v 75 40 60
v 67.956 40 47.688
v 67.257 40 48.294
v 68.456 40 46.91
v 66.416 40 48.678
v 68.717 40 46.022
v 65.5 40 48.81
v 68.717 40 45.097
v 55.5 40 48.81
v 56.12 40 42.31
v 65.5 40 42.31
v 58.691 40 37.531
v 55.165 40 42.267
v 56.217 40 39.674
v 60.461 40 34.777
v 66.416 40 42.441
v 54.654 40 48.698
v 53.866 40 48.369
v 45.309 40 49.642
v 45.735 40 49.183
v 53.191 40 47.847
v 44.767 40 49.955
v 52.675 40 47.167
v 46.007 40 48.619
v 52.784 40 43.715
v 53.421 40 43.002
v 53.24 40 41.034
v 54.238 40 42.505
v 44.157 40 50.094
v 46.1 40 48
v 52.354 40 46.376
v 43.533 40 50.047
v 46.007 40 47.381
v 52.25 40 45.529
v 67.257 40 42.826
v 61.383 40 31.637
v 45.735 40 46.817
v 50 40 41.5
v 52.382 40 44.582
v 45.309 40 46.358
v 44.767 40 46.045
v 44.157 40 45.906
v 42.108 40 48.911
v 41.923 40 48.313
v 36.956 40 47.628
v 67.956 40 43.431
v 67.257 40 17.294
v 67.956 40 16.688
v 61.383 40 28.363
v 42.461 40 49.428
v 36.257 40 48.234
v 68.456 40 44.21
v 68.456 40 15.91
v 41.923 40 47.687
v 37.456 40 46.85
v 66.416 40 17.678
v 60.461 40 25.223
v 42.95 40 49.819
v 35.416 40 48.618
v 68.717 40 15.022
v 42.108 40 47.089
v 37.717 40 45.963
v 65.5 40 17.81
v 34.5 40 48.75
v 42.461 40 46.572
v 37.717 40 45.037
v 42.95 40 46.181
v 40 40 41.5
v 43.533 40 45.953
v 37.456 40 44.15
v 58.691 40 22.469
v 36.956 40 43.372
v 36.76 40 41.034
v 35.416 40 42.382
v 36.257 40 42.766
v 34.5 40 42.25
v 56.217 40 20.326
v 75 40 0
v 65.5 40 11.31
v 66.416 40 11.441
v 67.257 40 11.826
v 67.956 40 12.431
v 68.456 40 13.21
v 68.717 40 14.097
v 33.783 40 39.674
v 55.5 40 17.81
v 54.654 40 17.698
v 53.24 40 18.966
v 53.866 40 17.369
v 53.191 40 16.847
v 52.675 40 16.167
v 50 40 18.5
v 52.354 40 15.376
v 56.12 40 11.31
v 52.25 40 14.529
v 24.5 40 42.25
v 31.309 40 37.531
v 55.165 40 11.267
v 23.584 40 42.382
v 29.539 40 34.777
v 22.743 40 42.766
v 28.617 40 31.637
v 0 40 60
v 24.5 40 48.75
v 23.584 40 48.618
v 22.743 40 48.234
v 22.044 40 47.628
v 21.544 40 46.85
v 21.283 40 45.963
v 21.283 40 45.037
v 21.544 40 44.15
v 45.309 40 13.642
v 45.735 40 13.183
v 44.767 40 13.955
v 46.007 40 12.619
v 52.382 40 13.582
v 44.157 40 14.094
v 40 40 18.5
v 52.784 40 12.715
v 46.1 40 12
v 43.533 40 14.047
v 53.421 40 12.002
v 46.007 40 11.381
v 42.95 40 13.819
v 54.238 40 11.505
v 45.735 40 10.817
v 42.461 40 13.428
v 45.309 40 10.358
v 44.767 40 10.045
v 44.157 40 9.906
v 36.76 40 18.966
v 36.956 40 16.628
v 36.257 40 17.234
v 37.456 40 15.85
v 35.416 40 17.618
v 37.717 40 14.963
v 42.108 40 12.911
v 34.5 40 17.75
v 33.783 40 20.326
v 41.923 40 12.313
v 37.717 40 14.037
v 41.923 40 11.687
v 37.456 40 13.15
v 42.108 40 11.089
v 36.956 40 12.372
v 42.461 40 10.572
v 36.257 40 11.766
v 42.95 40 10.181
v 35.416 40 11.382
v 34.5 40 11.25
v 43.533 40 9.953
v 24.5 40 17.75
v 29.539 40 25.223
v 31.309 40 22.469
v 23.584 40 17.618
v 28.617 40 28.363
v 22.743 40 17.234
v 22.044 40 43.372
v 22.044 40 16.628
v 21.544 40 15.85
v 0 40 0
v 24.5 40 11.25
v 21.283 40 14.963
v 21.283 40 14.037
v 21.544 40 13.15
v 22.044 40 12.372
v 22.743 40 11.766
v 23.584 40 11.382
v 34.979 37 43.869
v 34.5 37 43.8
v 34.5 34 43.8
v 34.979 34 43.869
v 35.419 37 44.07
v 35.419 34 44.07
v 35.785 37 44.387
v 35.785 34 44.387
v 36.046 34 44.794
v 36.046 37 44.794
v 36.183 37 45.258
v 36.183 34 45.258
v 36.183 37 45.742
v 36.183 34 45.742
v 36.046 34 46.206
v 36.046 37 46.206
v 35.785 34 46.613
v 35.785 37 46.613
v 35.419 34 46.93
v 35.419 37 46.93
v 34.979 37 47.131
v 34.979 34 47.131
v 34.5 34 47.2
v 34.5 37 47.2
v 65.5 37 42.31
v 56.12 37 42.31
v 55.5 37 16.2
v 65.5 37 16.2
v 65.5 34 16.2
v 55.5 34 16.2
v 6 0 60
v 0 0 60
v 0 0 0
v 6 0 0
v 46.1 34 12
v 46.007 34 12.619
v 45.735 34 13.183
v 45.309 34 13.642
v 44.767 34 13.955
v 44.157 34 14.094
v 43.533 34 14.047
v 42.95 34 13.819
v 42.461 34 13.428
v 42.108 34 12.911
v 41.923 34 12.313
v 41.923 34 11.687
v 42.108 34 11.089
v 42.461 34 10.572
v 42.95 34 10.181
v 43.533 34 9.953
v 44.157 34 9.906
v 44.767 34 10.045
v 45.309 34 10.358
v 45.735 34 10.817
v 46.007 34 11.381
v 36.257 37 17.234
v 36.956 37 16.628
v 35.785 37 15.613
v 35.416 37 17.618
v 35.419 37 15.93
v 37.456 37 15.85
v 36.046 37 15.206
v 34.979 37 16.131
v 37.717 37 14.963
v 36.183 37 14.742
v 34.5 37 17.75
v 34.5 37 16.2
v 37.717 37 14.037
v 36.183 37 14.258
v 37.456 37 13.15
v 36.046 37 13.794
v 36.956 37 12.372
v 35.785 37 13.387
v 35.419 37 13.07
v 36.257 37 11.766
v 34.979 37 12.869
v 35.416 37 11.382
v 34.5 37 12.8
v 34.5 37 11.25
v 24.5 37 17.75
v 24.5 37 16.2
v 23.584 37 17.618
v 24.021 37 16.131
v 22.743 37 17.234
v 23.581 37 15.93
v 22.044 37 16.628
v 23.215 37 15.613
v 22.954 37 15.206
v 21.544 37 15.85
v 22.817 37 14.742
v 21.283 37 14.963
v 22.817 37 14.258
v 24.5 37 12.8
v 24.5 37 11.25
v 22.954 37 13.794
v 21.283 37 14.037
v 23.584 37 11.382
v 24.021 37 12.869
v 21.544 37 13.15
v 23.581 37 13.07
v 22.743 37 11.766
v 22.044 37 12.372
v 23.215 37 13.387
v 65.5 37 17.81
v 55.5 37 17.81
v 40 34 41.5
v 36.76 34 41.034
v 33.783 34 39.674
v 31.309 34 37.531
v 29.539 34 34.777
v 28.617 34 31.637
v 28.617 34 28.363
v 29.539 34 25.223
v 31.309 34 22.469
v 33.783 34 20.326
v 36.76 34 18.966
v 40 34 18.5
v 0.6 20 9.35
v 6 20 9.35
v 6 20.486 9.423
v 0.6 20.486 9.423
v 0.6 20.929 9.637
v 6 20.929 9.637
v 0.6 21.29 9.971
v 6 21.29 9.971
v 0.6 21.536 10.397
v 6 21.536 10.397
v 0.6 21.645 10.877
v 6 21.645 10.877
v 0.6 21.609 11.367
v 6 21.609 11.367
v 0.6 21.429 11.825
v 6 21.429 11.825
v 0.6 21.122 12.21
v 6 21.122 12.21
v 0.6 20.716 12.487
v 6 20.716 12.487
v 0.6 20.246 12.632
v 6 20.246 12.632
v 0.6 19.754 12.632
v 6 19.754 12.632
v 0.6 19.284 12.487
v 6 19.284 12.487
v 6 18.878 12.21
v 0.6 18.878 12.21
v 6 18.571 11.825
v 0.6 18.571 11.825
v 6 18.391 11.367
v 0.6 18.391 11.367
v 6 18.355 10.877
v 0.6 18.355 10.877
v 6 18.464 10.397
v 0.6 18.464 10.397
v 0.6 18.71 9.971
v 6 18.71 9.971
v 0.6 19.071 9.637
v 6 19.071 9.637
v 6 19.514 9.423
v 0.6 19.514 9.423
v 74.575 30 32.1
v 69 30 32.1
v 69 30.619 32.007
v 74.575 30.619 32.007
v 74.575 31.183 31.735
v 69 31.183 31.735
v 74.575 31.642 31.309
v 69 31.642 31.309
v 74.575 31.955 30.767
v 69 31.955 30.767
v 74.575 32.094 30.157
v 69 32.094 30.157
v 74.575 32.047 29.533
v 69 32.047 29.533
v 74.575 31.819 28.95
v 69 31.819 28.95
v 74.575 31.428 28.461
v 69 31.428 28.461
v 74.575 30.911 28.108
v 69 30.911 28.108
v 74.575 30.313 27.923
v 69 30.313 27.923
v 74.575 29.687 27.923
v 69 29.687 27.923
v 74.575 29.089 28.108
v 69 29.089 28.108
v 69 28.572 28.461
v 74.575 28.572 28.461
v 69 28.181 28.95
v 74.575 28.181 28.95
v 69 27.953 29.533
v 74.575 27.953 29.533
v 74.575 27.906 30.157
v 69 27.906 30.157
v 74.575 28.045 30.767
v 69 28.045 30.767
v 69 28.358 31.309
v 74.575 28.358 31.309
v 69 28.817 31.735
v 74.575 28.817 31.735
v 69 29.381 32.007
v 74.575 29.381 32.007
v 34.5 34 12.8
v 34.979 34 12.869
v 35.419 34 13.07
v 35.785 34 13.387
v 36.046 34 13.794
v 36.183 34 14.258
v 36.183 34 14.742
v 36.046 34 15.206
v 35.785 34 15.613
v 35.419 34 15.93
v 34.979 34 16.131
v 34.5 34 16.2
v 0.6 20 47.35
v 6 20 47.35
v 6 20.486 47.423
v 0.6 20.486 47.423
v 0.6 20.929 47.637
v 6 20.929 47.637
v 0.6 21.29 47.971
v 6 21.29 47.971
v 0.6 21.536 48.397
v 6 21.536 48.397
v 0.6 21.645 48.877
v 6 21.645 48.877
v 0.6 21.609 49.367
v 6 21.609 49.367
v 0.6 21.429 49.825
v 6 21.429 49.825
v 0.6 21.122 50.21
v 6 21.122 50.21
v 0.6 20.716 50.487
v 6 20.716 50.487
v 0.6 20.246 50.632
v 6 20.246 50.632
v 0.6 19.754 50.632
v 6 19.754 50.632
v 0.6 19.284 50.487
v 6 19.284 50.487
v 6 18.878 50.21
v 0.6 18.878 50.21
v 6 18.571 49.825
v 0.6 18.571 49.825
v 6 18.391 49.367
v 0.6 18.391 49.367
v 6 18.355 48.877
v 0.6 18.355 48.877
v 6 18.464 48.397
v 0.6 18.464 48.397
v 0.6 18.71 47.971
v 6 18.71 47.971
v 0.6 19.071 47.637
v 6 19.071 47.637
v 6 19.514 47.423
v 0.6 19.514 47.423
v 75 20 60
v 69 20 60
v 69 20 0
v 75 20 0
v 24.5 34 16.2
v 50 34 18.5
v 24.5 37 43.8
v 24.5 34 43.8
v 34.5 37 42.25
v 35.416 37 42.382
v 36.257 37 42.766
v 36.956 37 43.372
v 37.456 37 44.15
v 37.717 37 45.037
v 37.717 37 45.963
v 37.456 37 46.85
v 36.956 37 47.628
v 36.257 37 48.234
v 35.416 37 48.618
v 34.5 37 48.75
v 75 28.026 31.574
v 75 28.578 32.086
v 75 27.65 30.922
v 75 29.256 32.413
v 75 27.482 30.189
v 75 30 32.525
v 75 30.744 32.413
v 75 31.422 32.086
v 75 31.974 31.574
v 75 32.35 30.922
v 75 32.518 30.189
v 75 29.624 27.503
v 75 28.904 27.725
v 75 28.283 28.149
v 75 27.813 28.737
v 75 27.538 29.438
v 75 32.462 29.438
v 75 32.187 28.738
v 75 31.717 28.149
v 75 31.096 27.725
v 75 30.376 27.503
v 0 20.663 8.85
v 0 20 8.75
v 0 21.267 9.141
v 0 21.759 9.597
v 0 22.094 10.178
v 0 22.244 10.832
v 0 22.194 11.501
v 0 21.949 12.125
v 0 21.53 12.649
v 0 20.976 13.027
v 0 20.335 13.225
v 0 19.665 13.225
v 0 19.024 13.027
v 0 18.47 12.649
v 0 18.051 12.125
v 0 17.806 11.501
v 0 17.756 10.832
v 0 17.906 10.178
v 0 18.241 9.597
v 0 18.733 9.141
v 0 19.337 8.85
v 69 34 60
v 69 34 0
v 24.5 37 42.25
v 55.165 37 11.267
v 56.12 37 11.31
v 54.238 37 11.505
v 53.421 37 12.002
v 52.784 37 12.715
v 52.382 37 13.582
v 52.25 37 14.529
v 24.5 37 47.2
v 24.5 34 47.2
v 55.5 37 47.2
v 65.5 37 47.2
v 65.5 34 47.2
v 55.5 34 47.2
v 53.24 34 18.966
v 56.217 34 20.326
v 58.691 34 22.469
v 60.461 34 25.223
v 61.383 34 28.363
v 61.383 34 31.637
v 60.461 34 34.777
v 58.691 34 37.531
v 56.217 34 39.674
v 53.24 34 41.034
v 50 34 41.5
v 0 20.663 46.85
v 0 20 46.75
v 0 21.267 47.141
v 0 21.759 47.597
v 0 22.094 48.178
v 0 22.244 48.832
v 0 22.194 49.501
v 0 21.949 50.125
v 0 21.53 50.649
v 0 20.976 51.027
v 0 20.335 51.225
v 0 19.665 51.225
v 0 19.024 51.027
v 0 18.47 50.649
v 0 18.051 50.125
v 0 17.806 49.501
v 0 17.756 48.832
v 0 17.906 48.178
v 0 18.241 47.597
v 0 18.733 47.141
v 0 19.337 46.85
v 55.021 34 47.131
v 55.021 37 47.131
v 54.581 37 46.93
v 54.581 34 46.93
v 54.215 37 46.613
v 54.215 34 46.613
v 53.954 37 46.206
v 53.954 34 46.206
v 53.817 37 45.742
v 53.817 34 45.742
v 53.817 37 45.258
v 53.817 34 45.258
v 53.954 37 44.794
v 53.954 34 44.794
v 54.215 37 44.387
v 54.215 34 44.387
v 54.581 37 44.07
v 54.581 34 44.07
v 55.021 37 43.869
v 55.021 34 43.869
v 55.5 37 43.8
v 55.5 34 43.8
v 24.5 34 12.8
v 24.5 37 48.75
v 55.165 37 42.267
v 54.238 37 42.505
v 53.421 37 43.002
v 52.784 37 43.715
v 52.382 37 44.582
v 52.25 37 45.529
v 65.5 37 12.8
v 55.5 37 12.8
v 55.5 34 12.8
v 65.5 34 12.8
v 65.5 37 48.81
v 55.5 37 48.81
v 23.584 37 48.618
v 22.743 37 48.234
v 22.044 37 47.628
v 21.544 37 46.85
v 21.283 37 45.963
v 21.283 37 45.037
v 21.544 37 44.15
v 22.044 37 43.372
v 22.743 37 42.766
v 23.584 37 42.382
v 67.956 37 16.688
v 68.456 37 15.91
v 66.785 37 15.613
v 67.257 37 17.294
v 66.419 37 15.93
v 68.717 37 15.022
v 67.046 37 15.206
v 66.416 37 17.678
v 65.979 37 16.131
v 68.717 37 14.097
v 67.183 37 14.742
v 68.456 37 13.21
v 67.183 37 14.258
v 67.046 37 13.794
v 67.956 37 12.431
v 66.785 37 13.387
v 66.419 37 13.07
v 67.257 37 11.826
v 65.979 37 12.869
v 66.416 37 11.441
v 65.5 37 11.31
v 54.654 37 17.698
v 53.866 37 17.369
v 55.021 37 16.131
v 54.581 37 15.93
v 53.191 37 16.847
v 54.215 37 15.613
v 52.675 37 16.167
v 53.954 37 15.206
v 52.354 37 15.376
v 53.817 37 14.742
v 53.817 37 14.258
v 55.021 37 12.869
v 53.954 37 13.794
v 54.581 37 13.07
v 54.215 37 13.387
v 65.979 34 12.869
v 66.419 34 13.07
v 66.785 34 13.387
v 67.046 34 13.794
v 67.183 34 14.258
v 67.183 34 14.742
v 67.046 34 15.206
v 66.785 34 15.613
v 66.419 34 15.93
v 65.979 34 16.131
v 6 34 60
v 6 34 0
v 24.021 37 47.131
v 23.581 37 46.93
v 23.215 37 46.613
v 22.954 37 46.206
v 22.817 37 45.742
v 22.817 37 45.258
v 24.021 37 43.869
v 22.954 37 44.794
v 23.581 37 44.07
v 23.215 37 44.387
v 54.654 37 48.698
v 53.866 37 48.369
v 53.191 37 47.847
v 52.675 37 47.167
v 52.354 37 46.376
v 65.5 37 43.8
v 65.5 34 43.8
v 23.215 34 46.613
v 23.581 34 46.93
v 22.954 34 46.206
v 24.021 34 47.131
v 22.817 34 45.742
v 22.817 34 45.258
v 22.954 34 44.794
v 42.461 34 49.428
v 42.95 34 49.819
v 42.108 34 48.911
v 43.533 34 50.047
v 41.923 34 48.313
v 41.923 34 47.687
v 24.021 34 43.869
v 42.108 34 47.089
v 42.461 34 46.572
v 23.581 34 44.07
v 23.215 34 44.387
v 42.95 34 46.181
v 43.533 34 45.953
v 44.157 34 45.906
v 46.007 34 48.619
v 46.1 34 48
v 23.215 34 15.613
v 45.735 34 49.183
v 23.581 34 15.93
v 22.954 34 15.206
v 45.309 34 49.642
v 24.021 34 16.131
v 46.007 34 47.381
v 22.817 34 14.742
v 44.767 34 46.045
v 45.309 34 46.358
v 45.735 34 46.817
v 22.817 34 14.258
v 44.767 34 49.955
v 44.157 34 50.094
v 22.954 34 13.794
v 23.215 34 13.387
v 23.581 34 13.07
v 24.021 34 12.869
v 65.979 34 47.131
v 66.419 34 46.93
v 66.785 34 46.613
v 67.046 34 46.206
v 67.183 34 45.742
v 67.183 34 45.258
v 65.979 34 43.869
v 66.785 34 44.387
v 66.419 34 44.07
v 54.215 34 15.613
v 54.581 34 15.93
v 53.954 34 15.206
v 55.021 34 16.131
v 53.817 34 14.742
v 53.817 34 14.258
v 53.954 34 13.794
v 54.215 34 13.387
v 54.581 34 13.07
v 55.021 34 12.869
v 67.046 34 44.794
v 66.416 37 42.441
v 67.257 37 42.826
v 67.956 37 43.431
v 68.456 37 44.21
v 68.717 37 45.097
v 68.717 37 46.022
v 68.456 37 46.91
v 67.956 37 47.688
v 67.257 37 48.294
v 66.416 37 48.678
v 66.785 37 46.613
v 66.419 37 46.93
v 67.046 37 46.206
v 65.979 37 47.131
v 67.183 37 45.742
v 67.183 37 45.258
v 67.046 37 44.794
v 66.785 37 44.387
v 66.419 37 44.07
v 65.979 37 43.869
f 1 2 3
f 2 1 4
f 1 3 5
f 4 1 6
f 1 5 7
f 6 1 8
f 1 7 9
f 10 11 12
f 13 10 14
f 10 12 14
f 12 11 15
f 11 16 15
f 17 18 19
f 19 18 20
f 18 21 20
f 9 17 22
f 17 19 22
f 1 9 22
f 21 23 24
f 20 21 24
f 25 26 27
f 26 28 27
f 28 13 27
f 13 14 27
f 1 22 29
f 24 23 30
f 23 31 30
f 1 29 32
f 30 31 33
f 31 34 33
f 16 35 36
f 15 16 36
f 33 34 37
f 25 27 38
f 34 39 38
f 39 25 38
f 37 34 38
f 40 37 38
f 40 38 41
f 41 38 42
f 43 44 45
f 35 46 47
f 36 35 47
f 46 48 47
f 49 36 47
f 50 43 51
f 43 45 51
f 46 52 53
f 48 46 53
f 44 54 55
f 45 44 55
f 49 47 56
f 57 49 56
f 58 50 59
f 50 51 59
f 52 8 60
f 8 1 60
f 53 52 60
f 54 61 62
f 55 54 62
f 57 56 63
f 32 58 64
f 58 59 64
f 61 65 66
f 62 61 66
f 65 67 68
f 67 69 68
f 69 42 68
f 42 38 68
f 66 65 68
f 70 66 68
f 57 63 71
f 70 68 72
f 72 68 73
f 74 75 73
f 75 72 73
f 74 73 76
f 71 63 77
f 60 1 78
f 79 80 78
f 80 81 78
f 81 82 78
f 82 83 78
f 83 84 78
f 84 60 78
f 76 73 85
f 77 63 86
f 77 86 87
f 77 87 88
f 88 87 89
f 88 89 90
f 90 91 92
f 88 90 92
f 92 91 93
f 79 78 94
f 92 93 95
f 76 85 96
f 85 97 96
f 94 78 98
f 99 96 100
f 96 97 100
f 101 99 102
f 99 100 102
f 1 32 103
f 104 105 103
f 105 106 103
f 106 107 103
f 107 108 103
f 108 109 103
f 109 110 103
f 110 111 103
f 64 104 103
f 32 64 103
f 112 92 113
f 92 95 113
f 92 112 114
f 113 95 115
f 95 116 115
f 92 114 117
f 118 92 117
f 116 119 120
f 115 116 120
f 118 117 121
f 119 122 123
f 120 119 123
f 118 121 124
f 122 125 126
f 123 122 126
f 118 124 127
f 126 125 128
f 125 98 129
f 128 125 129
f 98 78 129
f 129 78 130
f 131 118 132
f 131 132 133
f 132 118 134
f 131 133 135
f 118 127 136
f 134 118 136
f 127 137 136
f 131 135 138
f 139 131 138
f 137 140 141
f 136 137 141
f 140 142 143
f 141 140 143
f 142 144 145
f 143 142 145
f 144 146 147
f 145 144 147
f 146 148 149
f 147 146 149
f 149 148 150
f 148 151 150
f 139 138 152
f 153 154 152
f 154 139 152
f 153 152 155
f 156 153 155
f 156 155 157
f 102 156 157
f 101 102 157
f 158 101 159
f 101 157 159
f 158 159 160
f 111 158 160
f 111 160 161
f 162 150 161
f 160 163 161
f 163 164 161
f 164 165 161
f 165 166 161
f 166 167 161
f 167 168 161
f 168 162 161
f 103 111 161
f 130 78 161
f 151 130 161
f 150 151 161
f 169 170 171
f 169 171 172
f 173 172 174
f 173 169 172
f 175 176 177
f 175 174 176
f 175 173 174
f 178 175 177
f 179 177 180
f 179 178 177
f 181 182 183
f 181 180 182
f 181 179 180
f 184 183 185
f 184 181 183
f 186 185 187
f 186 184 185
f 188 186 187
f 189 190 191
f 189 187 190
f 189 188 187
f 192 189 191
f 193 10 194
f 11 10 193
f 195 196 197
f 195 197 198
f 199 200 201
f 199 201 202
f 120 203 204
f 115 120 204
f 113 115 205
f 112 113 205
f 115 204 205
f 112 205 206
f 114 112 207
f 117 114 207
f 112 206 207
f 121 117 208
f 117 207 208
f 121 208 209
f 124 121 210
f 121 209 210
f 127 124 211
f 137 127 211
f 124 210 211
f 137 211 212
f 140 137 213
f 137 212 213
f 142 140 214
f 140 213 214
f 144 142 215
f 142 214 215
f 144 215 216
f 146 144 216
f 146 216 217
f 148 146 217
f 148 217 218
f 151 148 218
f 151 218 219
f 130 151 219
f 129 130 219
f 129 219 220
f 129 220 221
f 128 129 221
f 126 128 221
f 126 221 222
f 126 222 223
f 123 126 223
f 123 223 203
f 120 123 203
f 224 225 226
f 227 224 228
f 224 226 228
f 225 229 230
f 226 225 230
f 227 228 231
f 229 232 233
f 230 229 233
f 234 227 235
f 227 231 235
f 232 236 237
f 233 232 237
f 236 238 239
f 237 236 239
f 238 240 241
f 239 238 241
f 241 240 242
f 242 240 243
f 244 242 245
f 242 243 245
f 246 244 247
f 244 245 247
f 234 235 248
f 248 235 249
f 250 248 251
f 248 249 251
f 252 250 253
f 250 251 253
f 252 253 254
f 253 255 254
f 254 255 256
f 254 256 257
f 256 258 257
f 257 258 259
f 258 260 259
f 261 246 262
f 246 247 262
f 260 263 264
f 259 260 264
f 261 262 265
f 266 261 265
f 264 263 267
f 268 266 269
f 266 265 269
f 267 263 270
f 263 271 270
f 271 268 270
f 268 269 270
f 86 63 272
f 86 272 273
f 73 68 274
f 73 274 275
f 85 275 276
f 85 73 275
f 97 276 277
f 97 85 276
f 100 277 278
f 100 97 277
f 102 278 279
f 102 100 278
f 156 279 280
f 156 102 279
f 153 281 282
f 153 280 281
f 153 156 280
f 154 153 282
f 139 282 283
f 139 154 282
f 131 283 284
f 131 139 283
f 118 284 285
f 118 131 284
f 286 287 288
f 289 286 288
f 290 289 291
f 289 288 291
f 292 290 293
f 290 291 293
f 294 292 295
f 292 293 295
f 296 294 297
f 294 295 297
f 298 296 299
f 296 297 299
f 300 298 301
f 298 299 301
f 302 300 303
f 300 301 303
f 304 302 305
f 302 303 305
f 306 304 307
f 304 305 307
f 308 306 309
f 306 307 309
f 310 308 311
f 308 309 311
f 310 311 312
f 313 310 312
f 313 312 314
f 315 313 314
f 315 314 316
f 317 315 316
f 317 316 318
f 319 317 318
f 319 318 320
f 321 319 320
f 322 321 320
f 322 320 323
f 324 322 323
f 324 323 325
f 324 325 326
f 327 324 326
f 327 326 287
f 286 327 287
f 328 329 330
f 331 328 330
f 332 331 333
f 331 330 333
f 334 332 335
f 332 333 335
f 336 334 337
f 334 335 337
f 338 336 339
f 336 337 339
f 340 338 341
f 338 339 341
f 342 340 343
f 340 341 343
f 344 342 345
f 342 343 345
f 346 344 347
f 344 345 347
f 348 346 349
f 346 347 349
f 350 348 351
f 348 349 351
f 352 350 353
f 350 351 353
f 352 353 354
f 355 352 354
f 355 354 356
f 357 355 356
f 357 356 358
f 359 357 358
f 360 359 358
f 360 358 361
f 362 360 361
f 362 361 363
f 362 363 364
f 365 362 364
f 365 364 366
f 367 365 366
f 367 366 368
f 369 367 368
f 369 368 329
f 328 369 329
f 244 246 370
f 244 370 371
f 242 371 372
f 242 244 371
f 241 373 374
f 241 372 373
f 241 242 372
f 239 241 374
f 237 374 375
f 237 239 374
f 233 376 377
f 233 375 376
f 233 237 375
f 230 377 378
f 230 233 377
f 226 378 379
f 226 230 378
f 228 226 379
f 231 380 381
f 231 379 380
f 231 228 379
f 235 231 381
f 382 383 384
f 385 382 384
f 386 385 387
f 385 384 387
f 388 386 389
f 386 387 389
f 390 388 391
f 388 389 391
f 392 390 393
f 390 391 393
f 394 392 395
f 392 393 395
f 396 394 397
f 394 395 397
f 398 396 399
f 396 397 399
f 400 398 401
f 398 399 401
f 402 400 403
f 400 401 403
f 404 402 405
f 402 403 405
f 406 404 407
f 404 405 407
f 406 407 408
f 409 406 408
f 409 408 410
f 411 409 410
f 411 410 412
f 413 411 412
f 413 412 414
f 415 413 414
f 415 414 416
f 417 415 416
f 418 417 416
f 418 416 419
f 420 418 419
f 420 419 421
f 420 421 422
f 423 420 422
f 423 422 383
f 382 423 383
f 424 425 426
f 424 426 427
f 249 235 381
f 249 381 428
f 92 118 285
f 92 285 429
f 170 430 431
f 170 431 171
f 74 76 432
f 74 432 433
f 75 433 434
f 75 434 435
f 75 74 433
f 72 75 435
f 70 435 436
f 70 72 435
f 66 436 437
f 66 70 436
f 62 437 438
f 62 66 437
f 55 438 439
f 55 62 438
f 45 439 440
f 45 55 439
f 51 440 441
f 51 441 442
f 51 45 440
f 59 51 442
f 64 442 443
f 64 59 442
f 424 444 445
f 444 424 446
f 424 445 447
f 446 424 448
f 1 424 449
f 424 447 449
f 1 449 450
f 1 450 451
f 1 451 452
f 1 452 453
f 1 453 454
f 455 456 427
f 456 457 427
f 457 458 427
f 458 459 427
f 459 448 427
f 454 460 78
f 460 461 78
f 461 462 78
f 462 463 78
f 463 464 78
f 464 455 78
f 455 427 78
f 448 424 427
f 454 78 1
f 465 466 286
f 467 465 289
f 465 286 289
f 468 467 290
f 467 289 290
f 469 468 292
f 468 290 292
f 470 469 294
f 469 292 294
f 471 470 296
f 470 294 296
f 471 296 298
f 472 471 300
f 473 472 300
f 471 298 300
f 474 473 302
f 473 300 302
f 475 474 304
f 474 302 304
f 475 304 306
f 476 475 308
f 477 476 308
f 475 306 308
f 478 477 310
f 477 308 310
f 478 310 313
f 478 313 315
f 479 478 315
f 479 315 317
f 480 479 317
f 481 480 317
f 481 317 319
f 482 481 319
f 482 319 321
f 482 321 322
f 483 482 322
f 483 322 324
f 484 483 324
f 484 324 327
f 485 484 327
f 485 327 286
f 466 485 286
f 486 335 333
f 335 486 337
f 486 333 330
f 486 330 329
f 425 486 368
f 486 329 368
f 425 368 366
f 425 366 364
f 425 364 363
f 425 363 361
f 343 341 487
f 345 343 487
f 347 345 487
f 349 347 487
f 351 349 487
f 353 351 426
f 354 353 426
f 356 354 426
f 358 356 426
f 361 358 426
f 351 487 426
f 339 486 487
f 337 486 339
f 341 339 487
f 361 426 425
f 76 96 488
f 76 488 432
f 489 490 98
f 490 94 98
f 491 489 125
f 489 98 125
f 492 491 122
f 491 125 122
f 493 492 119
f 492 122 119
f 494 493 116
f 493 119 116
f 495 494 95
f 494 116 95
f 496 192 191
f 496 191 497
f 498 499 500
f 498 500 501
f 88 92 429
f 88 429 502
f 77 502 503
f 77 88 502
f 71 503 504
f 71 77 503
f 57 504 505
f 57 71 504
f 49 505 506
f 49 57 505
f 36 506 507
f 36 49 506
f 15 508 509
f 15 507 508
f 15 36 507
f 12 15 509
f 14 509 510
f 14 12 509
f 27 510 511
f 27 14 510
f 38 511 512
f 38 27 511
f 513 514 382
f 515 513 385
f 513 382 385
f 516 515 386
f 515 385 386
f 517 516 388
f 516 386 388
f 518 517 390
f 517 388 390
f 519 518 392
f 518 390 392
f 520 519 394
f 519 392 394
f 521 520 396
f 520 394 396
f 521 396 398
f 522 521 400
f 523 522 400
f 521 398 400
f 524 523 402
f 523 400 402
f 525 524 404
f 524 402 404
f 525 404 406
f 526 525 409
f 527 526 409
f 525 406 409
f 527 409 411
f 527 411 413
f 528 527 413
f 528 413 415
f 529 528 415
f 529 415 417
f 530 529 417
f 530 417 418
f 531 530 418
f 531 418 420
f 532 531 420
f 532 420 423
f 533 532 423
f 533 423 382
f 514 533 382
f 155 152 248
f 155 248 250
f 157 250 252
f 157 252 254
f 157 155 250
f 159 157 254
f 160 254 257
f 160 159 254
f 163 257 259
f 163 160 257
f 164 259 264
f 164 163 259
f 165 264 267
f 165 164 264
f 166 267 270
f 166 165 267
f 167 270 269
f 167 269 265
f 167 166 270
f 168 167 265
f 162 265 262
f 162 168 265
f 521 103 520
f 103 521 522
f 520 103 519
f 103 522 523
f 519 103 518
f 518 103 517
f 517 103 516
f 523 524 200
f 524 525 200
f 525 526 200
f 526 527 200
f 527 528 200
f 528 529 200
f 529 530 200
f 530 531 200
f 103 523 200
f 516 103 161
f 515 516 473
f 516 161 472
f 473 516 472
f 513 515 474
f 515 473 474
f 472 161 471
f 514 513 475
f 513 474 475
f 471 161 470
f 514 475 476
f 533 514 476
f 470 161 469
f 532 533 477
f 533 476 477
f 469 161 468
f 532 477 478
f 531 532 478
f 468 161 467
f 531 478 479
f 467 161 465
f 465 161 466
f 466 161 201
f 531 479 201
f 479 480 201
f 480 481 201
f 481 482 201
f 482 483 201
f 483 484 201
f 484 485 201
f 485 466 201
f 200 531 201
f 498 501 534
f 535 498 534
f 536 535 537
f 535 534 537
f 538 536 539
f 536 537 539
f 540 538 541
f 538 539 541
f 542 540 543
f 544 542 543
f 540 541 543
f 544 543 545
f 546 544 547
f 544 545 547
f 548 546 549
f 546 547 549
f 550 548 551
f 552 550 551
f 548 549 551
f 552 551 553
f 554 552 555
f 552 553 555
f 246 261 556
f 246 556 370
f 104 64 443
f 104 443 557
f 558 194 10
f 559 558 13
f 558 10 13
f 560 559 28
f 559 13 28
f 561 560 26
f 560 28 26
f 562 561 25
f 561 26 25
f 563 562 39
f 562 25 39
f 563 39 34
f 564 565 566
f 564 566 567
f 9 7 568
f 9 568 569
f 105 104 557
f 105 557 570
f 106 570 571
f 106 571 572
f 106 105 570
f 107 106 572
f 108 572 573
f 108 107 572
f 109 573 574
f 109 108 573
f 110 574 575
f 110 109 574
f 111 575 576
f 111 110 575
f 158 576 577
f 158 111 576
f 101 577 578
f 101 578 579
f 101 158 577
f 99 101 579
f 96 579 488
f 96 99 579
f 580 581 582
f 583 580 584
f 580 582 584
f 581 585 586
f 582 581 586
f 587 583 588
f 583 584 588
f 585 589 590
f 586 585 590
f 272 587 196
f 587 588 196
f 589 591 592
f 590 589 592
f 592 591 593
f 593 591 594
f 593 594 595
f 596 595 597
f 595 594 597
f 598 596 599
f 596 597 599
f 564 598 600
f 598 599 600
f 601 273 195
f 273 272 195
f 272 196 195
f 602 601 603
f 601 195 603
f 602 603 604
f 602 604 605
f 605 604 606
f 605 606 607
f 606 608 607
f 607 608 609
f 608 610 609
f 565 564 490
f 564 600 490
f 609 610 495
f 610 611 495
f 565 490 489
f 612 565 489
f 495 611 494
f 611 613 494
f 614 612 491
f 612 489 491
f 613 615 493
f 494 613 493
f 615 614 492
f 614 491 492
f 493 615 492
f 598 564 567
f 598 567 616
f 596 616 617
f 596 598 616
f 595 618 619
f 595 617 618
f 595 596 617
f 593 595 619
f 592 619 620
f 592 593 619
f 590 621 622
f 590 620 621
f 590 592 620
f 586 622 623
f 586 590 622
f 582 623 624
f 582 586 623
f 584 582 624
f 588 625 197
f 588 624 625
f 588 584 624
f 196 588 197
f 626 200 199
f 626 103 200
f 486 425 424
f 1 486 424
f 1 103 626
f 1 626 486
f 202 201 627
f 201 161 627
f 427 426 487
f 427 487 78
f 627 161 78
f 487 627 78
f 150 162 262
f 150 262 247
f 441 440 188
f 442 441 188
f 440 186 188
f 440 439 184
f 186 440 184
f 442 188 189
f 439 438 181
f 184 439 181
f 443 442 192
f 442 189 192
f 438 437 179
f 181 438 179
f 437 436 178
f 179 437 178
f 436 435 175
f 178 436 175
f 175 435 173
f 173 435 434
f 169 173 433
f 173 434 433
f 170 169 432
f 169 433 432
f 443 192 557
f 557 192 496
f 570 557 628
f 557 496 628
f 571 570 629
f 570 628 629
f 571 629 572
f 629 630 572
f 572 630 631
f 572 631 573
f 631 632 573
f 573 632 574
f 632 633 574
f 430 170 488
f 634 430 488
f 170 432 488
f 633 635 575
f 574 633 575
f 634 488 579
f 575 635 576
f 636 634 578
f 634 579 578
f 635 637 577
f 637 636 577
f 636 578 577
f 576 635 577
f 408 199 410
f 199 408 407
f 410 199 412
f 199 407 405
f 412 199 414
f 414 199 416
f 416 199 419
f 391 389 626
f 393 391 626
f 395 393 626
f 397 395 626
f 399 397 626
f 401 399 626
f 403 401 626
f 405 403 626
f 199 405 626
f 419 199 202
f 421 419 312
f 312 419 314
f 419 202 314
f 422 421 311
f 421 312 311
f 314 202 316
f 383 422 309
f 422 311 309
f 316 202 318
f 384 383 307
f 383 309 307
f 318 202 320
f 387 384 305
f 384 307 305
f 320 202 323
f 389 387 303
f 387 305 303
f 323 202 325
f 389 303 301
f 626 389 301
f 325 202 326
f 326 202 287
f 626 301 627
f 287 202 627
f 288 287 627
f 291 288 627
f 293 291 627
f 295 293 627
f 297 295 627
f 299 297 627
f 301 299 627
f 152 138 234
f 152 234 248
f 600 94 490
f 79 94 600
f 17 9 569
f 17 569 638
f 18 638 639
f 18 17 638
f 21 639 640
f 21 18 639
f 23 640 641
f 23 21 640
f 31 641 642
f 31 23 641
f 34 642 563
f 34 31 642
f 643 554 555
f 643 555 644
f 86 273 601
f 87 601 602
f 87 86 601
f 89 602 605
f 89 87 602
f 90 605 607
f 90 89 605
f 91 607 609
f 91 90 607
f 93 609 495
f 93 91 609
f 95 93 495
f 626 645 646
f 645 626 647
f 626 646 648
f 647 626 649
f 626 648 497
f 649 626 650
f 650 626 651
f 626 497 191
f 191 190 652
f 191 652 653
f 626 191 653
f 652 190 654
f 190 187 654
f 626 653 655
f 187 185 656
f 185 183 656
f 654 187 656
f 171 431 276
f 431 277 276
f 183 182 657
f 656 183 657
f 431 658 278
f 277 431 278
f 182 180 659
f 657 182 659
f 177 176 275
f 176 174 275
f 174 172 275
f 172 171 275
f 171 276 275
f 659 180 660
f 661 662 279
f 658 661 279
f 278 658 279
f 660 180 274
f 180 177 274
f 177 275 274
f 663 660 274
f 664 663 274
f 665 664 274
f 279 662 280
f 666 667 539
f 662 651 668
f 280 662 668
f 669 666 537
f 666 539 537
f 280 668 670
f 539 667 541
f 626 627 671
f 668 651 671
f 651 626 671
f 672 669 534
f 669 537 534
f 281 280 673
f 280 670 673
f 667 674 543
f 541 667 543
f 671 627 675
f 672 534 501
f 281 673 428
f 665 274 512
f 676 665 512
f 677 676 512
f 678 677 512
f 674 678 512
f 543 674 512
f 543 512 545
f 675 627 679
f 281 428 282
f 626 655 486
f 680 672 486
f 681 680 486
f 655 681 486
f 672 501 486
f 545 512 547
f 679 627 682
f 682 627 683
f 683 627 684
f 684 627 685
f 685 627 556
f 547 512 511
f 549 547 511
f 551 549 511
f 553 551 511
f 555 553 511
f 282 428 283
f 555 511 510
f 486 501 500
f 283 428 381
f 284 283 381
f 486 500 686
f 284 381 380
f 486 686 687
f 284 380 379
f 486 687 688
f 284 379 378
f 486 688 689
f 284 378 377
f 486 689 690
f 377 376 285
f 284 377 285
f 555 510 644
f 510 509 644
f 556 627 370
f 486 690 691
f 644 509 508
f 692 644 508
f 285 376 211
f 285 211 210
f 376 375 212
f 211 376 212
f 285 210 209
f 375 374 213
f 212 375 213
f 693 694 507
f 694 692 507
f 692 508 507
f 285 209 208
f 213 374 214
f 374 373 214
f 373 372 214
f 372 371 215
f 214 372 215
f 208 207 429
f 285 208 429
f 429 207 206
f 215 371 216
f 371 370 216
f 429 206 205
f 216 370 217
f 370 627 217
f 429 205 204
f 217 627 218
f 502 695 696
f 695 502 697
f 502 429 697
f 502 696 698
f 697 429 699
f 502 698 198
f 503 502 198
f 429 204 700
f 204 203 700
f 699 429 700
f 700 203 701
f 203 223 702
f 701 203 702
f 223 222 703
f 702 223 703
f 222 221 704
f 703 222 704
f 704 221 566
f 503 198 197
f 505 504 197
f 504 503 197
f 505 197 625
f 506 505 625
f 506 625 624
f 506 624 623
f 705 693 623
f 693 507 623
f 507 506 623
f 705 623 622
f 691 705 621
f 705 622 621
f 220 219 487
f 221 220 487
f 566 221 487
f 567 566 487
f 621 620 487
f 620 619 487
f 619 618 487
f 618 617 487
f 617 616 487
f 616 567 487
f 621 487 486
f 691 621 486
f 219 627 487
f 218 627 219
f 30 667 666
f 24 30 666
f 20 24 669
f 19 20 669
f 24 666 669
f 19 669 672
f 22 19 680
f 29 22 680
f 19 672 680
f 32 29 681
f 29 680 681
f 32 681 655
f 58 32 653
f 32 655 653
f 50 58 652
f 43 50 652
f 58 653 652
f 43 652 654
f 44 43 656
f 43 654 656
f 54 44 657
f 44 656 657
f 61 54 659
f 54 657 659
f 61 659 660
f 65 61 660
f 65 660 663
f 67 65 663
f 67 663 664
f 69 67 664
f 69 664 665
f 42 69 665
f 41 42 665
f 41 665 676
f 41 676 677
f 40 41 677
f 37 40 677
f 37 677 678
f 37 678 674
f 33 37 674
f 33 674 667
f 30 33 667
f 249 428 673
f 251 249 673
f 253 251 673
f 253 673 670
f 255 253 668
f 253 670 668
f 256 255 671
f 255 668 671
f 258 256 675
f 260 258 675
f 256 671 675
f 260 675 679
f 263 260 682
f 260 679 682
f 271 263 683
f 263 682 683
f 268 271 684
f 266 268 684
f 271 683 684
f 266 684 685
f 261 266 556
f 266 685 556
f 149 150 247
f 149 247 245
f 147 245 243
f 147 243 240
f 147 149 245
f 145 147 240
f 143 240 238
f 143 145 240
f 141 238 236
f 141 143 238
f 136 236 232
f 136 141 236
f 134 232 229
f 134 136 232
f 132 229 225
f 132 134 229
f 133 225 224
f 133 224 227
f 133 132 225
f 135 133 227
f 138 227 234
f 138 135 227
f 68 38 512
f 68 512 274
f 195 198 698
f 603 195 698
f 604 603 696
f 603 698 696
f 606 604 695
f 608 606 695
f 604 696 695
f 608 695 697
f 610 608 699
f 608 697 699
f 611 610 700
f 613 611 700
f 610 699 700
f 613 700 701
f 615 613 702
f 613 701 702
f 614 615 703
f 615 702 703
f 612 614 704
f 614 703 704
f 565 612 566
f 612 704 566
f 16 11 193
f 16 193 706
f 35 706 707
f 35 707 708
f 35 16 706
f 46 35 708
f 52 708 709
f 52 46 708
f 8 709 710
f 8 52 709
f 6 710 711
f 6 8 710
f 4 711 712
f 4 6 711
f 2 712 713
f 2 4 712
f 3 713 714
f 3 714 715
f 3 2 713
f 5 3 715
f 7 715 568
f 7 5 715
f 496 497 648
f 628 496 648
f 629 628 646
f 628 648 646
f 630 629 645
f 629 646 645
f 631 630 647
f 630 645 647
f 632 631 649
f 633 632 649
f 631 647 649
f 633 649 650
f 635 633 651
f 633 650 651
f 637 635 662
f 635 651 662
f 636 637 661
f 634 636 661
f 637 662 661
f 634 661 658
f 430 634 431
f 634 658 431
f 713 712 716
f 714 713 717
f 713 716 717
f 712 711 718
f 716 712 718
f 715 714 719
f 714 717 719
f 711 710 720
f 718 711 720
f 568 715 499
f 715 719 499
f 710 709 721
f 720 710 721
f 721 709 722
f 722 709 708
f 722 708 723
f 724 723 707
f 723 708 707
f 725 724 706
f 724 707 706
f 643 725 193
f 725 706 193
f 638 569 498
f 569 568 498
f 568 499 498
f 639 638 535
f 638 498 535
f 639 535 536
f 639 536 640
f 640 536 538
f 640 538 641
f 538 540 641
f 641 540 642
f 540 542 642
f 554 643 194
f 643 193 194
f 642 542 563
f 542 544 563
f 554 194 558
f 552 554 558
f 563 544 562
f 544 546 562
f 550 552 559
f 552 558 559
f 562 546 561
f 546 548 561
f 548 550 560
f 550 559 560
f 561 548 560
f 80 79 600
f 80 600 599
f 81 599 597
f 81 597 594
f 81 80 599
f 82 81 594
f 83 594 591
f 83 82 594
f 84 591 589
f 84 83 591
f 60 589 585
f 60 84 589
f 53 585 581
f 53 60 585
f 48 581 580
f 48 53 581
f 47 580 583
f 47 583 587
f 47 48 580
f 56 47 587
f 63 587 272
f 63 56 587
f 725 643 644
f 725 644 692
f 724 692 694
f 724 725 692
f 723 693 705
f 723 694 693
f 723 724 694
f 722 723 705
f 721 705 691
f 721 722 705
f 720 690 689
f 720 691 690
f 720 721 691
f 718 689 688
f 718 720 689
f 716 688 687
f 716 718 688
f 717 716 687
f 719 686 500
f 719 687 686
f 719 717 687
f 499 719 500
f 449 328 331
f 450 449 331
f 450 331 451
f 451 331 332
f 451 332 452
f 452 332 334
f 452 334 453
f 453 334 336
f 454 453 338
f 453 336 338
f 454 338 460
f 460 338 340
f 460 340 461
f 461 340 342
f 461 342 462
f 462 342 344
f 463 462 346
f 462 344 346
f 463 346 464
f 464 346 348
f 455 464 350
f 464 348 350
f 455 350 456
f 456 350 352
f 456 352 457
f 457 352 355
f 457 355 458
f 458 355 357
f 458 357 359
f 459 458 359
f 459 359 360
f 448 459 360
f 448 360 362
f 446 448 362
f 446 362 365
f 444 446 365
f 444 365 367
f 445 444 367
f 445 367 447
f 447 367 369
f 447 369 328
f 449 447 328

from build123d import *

# Parameters (mm, degrees)
BOSS_EXTRUDE1_DEPTH                                 = 60
CUT_EXTRUDE1_DEPTH                                  = 105.043260233
CBORE_FOR_M3_HEX_SOCKET_HEAD_CAP_SCREW1_D           = 3.4
CBORE_FOR_M3_HEX_SOCKET_HEAD_CAP_SCREW1_CBORE_D     = 6.5
CBORE_FOR_M3_HEX_SOCKET_HEAD_CAP_SCREW1_CBORE_DEPTH = 3
CUT_EXTRUDE5_REACH                                  = 106.043
CUT_EXTRUDE6_DEPTH                                  = 3
M5_TAPPED_HOLE1_D                                   = 4.2
M4_TAPPED_HOLE1_D                                   = 3.3
M4_TAPPED_HOLE1_DEPTH                               = 6
M4_TAPPED_HOLE1_CSINK_D                             = 4.5
M4_TAPPED_HOLE1_CSINK_ANGLE                         = 90
M5_TAPPED_HOLE2_D                                   = 4.2
M5_TAPPED_HOLE2_DEPTH                               = 6
M5_TAPPED_HOLE2_CSINK_D                             = 5.05
M5_TAPPED_HOLE2_CSINK_ANGLE                         = 90


with BuildPart() as part:
    # Sketch1 → Boss-Extrude1 (new body)
    with BuildSketch(Plane.XY):
        Polygon((0, 0), (6, 0), (6, 34), (69, 34), (69, 20), (75, 20), (75, 40), (0, 40), align=None)
    extrude(amount=BOSS_EXTRUDE1_DEPTH)

    # Sketch2 → Cut-Extrude1 (cut, through all)
    with BuildSketch(Plane(origin=(0, 40, 0), x_dir=(1, 0, 0), z_dir=(0, 1, 0))):
        with BuildLine():
            Line((40, -18.5), (50, -18.5))
            ThreePointArc((50, -18.5), (61.5, -30), (50, -41.5))
            Line((50, -41.5), (40, -41.5))
            ThreePointArc((40, -41.5), (28.5, -30), (40, -18.5))
        make_face()
    extrude(amount=-CUT_EXTRUDE1_DEPTH, mode=Mode.SUBTRACT)

    # CBORE for M3 Hex Socket Head Cap Screw1 (through all)
    with Locations(Plane(origin=(0, 40, 0), x_dir=(-1, 0, 0), z_dir=(0, 1, 0))):
        with Locations((-24.5, 45.5), (-55.5, 45.5), (-24.5, 14.5), (-55.5, 14.5)):
            CounterBoreHole(CBORE_FOR_M3_HEX_SOCKET_HEAD_CAP_SCREW1_D / 2, CBORE_FOR_M3_HEX_SOCKET_HEAD_CAP_SCREW1_CBORE_D / 2, CBORE_FOR_M3_HEX_SOCKET_HEAD_CAP_SCREW1_CBORE_DEPTH)

    # Sketch24 → Cut-Extrude5 (cut, up to next)
    with BuildSketch(Plane(origin=(0, 40, 0), x_dir=(1, 0, 0), z_dir=(0, 1, 0)), mode=Mode.PRIVATE) as cut_extrude5_sk1:
        with BuildLine():
            Line((24.5, -12.8), (34.5, -12.8))
            ThreePointArc((34.5, -12.8), (36.2, -14.5), (34.5, -16.2))
            Line((34.5, -16.2), (24.5, -16.2))
            ThreePointArc((24.5, -16.2), (22.8, -14.5), (24.5, -12.8))
        make_face()
    cut_extrude5_tool1 = extrude(cut_extrude5_sk1.sketch, amount=-CUT_EXTRUDE5_REACH, mode=Mode.PRIVATE) & part.part
    # Sketch24 → Cut-Extrude5 (cut, up to next)
    with BuildSketch(Plane(origin=(0, 40, 0), x_dir=(1, 0, 0), z_dir=(0, 1, 0)), mode=Mode.PRIVATE) as cut_extrude5_sk2:
        with BuildLine():
            Line((55.5, -12.8), (65.5, -12.8))
            ThreePointArc((65.5, -12.8), (67.2, -14.5), (65.5, -16.2))
            Line((65.5, -16.2), (55.5, -16.2))
            ThreePointArc((55.5, -16.2), (53.8, -14.5), (55.5, -12.8))
        make_face()
    cut_extrude5_tool2 = extrude(cut_extrude5_sk2.sketch, amount=-CUT_EXTRUDE5_REACH, mode=Mode.PRIVATE) & part.part
    # Sketch24 → Cut-Extrude5 (cut, up to next)
    with BuildSketch(Plane(origin=(0, 40, 0), x_dir=(1, 0, 0), z_dir=(0, 1, 0)), mode=Mode.PRIVATE) as cut_extrude5_sk3:
        with BuildLine():
            Line((24.5, -43.8), (34.5, -43.8))
            ThreePointArc((34.5, -43.8), (36.2, -45.5), (34.5, -47.2))
            Line((34.5, -47.2), (24.5, -47.2))
            ThreePointArc((24.5, -47.2), (22.8, -45.5), (24.5, -43.8))
        make_face()
    cut_extrude5_tool3 = extrude(cut_extrude5_sk3.sketch, amount=-CUT_EXTRUDE5_REACH, mode=Mode.PRIVATE) & part.part
    # Sketch24 → Cut-Extrude5 (cut, up to next)
    with BuildSketch(Plane(origin=(0, 40, 0), x_dir=(1, 0, 0), z_dir=(0, 1, 0)), mode=Mode.PRIVATE) as cut_extrude5_sk4:
        with BuildLine():
            Line((55.5, -43.8), (65.5, -43.8))
            ThreePointArc((65.5, -43.8), (67.2, -45.5), (65.5, -47.2))
            Line((65.5, -47.2), (55.5, -47.2))
            ThreePointArc((55.5, -47.2), (53.8, -45.5), (55.5, -43.8))
        make_face()
    cut_extrude5_tool4 = extrude(cut_extrude5_sk4.sketch, amount=-CUT_EXTRUDE5_REACH, mode=Mode.PRIVATE) & part.part
    add(cut_extrude5_tool1.solids().sort_by_distance((29.5, 40, 14.5))[0], mode=Mode.SUBTRACT)
    add(cut_extrude5_tool2.solids().sort_by_distance((60.5, 40, 14.5))[0], mode=Mode.SUBTRACT)
    add(cut_extrude5_tool3.solids().sort_by_distance((29.5, 40, 45.5))[0], mode=Mode.SUBTRACT)
    add(cut_extrude5_tool4.solids().sort_by_distance((60.5, 40, 45.5))[0], mode=Mode.SUBTRACT)

    # Sketch25 → Cut-Extrude6 (cut)
    with BuildSketch(Plane(origin=(0, 40, 0), x_dir=(1, 0, 0), z_dir=(0, 1, 0))):
        with BuildLine():
            Line((24.5, -11.25), (34.5, -11.25))
            ThreePointArc((34.5, -11.25), (37.75, -14.5), (34.5, -17.75))
            Line((34.5, -17.75), (24.5, -17.75))
            ThreePointArc((24.5, -17.75), (21.25, -14.5), (24.5, -11.25))
        make_face()
        with BuildLine():
            Line((55.499988687, -11.3096476), (65.499988687, -11.3096476))
            ThreePointArc((65.499988687, -11.3096476), (68.749988687, -14.5596476), (65.499988687, -17.8096476))
            Line((65.499988687, -17.8096476), (55.499988687, -17.8096476))
            ThreePointArc((55.499988687, -17.8096476), (52.249988687, -14.5596476), (55.499988687, -11.3096476))
        make_face()
        with BuildLine():
            Line((24.5, -42.25), (34.5, -42.25))
            ThreePointArc((34.5, -42.25), (37.75, -45.5), (34.5, -48.75))
            Line((34.5, -48.75), (24.5, -48.75))
            ThreePointArc((24.5, -48.75), (21.25, -45.5), (24.5, -42.25))
        make_face()
        with BuildLine():
            Line((55.499988687, -42.3096476), (65.499988687, -42.3096476))
            ThreePointArc((65.499988687, -42.3096476), (68.749988687, -45.5596476), (65.499988687, -48.8096476))
            Line((65.499988687, -48.8096476), (55.499988687, -48.8096476))
            ThreePointArc((55.499988687, -48.8096476), (52.249988687, -45.5596476), (55.499988687, -42.3096476))
        make_face()
    extrude(amount=-CUT_EXTRUDE6_DEPTH, mode=Mode.SUBTRACT)

    # M5 Tapped Hole1 (through all)
    with Locations(Plane(origin=(0, 40, 0), x_dir=(-1, 0, 0), z_dir=(0, 1, 0))):
        with Locations((-44, 12), (-44, 48)):
            Hole(M5_TAPPED_HOLE1_D / 2)

    # M4 Tapped Hole1
    with Locations(Plane.ZY):
        with Locations((11, 20), (49, 20)):
            CounterSinkHole(M4_TAPPED_HOLE1_D / 2, M4_TAPPED_HOLE1_CSINK_D / 2, depth=M4_TAPPED_HOLE1_DEPTH, counter_sink_angle=M4_TAPPED_HOLE1_CSINK_ANGLE)

    # M5 Tapped Hole2
    with Locations(Plane(origin=(75, 0, 0), x_dir=(0, 0, -1), z_dir=(1, 0, 0))):
        with Locations((-30, 30)):
            CounterSinkHole(M5_TAPPED_HOLE2_D / 2, M5_TAPPED_HOLE2_CSINK_D / 2, depth=M5_TAPPED_HOLE2_DEPTH, counter_sink_angle=M5_TAPPED_HOLE2_CSINK_ANGLE)


solid = part.part
